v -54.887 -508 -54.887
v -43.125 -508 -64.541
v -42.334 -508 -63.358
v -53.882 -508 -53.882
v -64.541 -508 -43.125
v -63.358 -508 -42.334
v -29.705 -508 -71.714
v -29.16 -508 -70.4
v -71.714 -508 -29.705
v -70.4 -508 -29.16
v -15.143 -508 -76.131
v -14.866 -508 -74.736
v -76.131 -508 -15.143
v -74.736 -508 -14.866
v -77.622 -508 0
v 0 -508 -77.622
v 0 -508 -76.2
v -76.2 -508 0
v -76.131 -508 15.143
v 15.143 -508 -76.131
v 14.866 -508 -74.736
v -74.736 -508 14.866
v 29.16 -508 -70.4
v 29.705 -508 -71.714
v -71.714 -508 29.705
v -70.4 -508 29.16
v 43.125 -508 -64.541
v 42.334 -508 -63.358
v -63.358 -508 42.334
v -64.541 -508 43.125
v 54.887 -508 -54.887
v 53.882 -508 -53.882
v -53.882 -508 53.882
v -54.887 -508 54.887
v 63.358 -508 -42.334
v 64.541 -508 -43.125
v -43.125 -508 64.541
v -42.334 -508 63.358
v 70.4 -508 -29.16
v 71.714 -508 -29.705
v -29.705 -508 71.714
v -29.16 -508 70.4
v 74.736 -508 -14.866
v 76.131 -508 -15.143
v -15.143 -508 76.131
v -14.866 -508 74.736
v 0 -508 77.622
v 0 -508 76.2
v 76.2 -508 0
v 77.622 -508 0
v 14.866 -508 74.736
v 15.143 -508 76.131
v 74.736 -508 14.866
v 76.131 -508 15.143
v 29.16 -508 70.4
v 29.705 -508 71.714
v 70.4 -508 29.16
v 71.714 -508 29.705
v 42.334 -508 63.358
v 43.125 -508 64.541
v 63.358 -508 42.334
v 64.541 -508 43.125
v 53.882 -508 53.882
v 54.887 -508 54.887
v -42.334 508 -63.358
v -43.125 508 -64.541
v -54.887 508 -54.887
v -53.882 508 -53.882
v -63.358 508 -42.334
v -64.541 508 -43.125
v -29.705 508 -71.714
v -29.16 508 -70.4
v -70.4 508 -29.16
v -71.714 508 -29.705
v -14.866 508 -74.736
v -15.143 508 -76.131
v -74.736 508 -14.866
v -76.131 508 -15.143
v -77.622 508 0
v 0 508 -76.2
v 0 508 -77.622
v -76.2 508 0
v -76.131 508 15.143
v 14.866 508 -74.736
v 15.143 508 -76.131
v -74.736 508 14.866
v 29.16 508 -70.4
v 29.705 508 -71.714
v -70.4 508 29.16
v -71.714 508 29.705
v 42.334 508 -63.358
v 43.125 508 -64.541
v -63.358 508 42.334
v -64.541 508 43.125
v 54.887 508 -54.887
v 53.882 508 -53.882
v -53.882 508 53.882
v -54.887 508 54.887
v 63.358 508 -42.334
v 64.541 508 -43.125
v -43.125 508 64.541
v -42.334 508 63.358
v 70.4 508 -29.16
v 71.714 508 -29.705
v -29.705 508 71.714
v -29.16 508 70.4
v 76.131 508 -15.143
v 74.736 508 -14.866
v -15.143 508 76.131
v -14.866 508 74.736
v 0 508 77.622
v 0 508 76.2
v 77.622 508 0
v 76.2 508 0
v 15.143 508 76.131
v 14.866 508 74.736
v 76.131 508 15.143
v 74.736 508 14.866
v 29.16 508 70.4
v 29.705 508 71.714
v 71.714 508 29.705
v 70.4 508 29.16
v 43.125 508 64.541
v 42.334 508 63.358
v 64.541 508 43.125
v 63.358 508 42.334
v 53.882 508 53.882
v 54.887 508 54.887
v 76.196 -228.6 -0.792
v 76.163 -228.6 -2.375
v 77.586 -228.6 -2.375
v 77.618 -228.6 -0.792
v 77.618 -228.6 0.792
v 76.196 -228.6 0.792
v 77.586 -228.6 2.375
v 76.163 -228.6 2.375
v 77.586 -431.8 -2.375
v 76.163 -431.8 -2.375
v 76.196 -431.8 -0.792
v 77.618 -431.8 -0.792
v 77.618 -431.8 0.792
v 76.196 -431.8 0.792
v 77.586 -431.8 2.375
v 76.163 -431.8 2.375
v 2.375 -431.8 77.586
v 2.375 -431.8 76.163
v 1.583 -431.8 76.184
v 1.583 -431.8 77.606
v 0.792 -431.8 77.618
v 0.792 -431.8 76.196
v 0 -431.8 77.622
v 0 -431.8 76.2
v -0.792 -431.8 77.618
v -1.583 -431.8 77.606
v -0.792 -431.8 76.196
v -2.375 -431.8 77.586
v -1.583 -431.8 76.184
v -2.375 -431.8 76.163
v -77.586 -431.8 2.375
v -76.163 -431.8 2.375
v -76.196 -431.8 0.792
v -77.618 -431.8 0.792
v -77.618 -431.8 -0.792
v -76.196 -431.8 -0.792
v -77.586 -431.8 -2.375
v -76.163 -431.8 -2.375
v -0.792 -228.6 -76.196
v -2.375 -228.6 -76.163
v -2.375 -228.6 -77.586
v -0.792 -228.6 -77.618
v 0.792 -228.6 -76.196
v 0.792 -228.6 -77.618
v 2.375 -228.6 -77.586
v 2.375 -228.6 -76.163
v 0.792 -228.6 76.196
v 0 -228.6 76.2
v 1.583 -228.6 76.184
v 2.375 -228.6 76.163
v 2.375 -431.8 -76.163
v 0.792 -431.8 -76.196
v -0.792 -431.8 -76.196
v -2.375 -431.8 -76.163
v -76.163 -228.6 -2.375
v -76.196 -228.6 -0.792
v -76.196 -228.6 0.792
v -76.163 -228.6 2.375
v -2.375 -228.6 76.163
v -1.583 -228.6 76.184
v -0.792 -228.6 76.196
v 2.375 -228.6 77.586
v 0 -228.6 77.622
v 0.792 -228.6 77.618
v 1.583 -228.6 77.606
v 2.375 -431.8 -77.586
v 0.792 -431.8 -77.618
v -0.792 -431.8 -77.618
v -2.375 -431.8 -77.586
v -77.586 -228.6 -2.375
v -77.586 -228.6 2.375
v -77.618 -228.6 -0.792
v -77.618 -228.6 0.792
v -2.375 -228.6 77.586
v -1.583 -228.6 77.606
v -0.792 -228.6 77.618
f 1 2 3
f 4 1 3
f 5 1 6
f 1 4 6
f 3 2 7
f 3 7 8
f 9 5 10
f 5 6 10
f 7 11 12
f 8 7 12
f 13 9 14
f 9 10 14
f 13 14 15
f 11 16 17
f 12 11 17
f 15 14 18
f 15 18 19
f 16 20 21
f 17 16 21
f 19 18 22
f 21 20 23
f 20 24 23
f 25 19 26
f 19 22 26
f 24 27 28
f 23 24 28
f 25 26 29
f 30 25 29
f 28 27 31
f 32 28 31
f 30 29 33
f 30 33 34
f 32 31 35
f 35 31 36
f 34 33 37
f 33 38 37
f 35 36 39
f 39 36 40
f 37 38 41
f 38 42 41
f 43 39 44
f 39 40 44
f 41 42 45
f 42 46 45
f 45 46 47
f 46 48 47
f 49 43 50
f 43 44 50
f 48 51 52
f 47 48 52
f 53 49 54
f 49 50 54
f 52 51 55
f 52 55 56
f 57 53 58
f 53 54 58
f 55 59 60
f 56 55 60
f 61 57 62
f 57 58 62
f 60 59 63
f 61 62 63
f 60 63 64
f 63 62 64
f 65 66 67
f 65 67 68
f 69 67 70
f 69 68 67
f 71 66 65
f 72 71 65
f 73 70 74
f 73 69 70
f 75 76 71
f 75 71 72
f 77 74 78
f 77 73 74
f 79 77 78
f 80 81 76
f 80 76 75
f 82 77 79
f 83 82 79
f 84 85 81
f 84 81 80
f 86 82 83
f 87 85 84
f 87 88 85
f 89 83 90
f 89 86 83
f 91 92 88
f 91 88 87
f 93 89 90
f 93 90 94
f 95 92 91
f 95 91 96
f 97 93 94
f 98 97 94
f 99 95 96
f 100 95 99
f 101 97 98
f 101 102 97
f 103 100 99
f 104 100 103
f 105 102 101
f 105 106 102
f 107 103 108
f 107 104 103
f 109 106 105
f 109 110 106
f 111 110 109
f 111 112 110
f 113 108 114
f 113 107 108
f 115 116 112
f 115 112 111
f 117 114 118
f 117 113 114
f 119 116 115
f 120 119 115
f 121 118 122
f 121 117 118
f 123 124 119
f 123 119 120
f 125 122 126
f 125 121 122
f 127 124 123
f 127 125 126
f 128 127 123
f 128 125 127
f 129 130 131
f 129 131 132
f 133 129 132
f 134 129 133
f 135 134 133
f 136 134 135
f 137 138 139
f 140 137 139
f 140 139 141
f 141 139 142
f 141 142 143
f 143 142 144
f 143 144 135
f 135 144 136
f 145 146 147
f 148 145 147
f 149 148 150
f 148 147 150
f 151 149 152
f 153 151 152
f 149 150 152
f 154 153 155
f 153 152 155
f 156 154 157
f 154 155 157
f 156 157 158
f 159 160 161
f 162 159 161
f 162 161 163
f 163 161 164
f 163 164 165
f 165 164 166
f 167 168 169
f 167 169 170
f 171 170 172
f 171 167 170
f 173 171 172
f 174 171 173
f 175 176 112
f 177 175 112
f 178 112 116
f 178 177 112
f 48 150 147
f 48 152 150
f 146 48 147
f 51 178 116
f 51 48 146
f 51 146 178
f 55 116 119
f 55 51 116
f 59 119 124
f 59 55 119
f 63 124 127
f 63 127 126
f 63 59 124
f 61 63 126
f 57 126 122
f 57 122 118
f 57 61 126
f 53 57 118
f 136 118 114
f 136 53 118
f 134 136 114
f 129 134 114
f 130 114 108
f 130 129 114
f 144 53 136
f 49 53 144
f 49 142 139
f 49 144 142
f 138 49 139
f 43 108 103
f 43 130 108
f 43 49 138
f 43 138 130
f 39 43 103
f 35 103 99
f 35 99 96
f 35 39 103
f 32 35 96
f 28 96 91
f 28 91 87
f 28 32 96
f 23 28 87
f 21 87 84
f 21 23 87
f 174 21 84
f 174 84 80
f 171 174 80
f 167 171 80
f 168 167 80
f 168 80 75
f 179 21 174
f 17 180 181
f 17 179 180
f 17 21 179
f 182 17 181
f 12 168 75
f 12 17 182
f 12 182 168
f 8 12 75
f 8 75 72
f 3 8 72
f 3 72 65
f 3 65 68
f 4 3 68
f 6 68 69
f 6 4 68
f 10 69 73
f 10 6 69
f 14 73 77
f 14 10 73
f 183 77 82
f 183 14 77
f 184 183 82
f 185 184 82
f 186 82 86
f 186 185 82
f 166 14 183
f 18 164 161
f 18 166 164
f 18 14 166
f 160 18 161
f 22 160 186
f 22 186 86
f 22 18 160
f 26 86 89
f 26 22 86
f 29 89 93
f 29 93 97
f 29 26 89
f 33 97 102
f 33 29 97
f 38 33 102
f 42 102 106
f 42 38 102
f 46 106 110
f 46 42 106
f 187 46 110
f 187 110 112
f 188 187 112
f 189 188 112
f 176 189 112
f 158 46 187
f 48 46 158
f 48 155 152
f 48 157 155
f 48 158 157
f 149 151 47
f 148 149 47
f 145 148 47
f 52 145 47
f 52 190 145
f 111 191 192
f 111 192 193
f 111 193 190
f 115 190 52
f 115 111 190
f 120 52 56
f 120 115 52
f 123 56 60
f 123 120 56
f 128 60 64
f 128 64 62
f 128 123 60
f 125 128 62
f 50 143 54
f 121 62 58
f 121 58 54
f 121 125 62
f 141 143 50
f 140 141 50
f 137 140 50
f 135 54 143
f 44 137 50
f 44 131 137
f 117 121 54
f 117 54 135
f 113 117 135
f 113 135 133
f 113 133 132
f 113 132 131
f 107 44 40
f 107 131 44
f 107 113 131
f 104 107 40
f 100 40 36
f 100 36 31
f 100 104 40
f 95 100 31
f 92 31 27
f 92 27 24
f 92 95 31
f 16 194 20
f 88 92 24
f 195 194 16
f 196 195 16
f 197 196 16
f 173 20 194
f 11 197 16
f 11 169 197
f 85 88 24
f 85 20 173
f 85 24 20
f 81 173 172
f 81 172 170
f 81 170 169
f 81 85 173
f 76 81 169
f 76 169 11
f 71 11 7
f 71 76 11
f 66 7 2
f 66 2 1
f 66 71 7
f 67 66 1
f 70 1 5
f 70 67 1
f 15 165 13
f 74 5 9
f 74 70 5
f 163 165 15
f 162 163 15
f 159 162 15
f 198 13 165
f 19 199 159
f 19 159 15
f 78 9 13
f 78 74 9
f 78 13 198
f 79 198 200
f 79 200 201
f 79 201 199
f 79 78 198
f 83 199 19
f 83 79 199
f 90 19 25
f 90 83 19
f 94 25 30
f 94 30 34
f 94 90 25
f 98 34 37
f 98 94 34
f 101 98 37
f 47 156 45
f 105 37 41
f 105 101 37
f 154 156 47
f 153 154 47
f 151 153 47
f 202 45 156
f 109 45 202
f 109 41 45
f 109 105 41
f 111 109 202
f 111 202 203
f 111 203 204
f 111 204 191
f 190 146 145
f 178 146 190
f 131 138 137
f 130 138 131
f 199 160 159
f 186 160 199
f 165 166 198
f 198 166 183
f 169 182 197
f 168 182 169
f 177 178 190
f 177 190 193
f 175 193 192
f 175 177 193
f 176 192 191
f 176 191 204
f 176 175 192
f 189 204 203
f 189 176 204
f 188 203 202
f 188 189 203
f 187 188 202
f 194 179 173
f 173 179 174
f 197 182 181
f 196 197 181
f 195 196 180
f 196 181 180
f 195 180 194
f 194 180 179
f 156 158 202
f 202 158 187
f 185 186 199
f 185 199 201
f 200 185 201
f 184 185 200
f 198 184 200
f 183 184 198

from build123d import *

# Parameters (mm, degrees)
SKETCH1_R           = 77.6224
SKETCH1_R_2         = 76.2
BOSS_EXTRUDE1_DEPTH = 508
SKETCH3_W           = 4.7498
SKETCH3_H           = 203.2
CUT_EXTRUDE1_DEPTH  = 520.72538322
CIRPATTERN2_COUNT   = 4


with BuildPart() as part:
    # Sketch1 → Boss-Extrude1 (new, symmetric)
    with BuildSketch(Plane(origin=(0, 0, 0), x_dir=(1, 0, 0), z_dir=(0, 1, 0))):
        with Locations(Location((0, 0, 0), (0, 0, 270))):
            Circle(SKETCH1_R)
        with Locations(Location((0, 0, 0), (0, 0, 270))):
            Circle(SKETCH1_R_2, mode=Mode.SUBTRACT)
    extrude(amount=BOSS_EXTRUDE1_DEPTH, both=True)

    # Sketch3 → Cut-Extrude1 (cut, through all)
    with BuildSketch(Plane.XY):
        with Locations((0, -330.2)):
            Rectangle(SKETCH3_W, SKETCH3_H)
    cut_extrude1 = extrude(amount=-CUT_EXTRUDE1_DEPTH, mode=Mode.SUBTRACT)

    # CirPattern2: Cut-Extrude1 ×4 about axis
    cirpattern2_axis = Axis((0, 0, 0), (0, 1, 0))
    for i in range(1, CIRPATTERN2_COUNT):
        add(cut_extrude1.rotate(cirpattern2_axis, i * 360 / CIRPATTERN2_COUNT), mode=Mode.SUBTRACT)


solid = part.part
